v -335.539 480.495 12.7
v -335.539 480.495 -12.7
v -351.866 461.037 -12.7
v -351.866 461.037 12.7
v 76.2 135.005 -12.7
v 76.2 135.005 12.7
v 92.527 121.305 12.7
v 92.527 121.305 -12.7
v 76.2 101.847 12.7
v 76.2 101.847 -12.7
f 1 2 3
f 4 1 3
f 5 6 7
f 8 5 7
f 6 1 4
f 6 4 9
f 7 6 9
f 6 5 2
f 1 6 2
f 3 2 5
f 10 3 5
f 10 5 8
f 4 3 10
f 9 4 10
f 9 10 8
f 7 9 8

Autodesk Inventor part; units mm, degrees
ref_plane "XZ Plane" through (0, 0, 0) normal (0, 1, 0) x (-1, 0, 0)
ref_plane "XY Plane" through (0, 0, 0) normal (0, 0, 1) x (1, 0, 0)
sketch "Sketch1" plane through (0, 0, 0) normal (0, 0, 1) x (1, 0, 0)
  line L0 (-351.8656, 461.0371) -> (76.2, 101.8473)
  line L1 (76.2, 135.0047) -> (-335.5388, 480.4946)
  line L2 (-335.5388, 480.4946) -> (-351.8656, 461.0371)
  line L3 (0, 0) -> (0, 391.6762) construction
  line L4 (76.2, 135.0047) -> (76.2, 101.8473)
  line L5 (76.2, 135.0047) -> (92.5268, 121.3049)
  line L6 (76.2, 101.8473) -> (92.5268, 121.3049)
  dimension "d29" = 76.2
  dimension "d30" = 558.8
extrude "Extrusion2" add sketch "Sketch1" along normal mid plane 25.4
ref_plane "Work Plane1" through (88.9, 0, 0) normal (1, 0, 0) x (0, 1, 0)
properties part number "newPullyV03"
